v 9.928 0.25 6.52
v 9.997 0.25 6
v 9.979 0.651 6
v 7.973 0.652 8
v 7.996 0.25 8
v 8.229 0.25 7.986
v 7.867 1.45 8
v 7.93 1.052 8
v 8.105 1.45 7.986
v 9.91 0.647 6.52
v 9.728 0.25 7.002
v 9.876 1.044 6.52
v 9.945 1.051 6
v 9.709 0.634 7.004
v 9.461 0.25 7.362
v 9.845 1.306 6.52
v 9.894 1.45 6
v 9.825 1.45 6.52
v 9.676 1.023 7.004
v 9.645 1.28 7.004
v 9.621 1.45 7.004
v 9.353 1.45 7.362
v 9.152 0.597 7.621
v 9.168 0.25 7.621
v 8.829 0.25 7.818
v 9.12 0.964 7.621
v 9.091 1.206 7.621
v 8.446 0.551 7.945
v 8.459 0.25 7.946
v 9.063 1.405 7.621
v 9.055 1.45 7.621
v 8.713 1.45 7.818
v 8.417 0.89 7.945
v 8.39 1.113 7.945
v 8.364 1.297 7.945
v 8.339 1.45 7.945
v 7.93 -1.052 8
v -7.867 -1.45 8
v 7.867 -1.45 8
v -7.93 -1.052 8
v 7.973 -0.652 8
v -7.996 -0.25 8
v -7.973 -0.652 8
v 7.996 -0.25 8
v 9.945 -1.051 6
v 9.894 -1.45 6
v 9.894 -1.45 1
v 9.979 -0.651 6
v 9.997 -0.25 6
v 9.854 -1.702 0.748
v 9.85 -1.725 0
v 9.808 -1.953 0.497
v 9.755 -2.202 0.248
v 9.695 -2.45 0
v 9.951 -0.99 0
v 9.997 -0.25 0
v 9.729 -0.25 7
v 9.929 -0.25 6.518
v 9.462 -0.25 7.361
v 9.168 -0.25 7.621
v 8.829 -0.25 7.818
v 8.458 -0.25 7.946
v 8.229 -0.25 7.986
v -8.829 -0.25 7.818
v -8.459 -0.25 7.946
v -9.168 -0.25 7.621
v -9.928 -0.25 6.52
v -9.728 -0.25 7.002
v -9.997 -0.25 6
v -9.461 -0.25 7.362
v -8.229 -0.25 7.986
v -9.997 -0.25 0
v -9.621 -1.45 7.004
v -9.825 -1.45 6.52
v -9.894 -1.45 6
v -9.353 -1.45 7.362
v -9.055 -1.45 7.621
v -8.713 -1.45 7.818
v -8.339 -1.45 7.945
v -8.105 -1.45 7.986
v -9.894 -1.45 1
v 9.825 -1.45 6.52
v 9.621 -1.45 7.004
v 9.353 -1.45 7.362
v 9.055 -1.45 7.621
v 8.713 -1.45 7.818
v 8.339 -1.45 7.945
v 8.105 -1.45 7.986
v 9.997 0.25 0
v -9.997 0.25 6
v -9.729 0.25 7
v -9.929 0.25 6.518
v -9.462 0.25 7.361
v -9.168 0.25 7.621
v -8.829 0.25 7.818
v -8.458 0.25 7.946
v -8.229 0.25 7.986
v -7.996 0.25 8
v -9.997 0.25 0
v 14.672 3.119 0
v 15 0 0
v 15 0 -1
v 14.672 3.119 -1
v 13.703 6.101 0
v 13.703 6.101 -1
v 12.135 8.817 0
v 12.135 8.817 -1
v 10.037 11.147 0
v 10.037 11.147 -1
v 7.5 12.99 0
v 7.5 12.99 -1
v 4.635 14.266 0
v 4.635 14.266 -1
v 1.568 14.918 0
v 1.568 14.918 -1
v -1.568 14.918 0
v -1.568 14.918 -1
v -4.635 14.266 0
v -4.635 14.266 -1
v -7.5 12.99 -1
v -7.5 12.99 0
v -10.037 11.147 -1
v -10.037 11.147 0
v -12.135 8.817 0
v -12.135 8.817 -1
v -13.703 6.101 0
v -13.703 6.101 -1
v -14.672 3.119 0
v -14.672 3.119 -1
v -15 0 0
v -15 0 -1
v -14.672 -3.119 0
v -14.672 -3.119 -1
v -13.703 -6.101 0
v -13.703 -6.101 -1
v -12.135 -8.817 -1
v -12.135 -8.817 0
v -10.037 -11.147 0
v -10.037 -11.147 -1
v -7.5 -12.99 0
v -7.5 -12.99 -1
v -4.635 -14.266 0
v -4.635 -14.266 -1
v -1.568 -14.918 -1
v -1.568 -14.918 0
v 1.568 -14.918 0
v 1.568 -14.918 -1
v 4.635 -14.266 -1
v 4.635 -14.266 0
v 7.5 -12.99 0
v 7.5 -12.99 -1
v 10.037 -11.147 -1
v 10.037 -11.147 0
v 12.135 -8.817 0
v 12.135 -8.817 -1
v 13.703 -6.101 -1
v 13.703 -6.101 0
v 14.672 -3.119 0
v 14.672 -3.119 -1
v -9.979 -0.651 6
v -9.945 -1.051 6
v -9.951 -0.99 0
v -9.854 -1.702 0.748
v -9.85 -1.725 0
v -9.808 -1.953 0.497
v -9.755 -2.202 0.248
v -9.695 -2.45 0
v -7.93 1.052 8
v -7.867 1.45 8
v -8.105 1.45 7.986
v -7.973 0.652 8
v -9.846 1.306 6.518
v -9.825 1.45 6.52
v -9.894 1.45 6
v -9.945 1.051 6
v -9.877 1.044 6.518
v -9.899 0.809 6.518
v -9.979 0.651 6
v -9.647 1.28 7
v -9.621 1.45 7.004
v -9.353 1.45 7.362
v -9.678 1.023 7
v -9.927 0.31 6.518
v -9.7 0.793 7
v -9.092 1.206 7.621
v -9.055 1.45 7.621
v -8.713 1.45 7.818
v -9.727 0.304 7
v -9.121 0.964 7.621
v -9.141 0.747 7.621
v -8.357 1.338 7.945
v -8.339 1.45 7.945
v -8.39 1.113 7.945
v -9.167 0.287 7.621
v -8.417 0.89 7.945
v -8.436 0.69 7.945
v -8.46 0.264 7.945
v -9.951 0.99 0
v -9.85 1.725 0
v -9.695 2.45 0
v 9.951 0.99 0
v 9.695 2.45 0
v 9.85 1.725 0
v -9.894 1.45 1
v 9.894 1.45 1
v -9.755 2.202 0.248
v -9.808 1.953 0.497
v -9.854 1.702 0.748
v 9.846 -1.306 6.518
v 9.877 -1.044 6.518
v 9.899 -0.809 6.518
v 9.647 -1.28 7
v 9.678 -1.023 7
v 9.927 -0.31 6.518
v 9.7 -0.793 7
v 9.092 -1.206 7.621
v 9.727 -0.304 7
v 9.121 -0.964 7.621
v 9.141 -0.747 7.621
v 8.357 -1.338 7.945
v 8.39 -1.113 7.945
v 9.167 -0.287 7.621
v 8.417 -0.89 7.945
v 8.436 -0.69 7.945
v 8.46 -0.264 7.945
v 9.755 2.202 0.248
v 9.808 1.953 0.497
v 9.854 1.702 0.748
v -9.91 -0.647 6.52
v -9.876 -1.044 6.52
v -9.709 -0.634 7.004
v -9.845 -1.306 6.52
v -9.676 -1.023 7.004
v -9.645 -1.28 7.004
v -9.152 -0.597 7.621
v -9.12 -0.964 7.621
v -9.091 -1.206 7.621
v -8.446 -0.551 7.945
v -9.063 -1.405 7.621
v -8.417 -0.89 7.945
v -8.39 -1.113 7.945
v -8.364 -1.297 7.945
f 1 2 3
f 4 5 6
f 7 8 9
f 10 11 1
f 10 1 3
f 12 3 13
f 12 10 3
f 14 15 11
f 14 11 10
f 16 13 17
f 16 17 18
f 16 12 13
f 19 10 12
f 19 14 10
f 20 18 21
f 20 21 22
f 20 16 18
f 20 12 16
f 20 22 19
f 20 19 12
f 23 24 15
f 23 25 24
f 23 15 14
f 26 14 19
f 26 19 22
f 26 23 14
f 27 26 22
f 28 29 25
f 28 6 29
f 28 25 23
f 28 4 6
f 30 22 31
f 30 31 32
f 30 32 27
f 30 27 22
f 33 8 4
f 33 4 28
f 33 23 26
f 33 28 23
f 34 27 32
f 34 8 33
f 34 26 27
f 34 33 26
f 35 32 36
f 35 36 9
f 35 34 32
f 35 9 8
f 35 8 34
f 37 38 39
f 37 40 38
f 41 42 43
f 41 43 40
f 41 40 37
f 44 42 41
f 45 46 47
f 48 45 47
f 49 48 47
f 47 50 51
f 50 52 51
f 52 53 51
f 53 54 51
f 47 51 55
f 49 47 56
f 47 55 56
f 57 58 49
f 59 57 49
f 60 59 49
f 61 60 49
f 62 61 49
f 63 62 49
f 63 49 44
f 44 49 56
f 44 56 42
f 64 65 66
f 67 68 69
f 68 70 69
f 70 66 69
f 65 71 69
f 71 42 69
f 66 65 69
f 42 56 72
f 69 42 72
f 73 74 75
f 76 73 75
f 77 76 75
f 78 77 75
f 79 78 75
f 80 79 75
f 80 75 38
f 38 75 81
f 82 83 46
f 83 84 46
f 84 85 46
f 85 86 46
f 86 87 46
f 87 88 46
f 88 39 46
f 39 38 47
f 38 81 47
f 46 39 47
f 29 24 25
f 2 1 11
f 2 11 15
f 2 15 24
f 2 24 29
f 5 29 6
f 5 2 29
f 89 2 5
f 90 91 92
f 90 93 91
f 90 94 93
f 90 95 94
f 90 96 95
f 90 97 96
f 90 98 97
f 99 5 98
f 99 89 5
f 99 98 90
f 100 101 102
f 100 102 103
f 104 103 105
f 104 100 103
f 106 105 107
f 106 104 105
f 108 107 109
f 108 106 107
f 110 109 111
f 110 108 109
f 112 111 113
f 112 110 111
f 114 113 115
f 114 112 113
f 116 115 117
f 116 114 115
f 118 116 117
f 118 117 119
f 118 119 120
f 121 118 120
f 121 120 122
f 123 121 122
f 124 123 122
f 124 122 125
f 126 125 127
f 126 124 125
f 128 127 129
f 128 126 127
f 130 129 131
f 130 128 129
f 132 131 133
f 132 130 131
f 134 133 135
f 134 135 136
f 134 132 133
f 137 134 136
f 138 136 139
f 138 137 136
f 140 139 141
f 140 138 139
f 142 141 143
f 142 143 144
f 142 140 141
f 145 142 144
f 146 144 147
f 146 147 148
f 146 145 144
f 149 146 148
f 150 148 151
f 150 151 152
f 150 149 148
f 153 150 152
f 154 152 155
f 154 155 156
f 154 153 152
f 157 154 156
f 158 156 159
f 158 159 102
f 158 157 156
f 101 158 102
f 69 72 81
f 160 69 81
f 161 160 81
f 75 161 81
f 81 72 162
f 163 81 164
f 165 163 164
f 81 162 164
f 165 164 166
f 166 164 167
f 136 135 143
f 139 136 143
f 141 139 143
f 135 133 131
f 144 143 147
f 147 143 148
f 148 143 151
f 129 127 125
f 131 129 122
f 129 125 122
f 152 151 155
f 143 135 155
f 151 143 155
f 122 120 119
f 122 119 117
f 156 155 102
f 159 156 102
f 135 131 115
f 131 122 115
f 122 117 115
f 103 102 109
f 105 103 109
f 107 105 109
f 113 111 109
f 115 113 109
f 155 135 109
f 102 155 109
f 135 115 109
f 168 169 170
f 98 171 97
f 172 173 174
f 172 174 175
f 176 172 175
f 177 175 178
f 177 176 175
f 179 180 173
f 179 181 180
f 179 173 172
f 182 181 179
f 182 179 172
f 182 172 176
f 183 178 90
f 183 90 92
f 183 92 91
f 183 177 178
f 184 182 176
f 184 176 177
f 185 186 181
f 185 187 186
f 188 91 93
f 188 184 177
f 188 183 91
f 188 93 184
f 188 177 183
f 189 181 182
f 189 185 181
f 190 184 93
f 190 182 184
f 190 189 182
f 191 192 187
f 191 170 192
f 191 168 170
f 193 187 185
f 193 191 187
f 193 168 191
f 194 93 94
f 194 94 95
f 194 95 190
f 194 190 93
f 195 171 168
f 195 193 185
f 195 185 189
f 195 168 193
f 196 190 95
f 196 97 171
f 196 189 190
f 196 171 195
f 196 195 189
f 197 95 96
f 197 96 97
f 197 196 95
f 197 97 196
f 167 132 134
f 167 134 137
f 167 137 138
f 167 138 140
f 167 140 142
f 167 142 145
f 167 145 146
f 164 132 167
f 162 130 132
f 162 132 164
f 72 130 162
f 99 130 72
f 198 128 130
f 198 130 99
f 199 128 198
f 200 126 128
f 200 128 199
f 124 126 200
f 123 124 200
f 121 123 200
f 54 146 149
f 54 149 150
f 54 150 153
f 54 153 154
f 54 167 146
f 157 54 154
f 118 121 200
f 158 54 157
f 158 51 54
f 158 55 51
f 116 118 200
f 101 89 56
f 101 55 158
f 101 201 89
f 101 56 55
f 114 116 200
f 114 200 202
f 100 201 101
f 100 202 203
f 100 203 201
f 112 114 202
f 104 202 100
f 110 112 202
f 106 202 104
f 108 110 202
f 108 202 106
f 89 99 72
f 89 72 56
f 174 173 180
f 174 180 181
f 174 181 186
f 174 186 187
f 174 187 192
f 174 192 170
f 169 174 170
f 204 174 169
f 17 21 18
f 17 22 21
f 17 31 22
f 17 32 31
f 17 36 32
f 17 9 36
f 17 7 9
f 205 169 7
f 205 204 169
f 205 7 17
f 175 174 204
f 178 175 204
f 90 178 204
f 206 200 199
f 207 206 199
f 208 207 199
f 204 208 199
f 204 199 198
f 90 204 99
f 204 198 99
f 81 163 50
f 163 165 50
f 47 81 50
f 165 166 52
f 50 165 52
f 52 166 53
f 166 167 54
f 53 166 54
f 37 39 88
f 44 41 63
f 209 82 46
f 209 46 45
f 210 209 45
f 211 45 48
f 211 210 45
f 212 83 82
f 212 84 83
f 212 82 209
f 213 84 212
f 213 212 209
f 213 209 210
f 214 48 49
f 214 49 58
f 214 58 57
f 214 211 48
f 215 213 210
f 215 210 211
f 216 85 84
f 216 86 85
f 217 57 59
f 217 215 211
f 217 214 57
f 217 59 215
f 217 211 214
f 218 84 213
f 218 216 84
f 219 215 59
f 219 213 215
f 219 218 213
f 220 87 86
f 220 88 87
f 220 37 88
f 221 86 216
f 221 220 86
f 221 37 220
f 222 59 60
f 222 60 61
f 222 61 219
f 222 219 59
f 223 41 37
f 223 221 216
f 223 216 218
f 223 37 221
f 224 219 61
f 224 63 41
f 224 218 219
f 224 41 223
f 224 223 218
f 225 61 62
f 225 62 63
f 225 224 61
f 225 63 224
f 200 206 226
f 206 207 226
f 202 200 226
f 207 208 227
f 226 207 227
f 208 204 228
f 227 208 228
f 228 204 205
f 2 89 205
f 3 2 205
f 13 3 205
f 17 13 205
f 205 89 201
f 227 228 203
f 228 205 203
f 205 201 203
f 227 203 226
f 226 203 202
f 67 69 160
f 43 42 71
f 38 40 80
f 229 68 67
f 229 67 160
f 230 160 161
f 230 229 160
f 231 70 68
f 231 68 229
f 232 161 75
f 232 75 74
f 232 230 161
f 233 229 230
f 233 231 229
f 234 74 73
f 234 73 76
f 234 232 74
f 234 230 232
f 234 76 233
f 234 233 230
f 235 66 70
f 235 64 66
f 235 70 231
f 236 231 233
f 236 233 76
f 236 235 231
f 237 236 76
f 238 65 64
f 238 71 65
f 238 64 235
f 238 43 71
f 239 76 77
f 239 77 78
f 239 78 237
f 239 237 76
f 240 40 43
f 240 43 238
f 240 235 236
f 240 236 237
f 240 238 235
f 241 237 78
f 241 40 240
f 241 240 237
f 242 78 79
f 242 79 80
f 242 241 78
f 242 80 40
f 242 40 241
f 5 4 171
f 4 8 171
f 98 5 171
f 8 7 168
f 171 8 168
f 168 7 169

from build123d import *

# Parameters (mm, degrees)
SKETCH_R     = 15
PAD_DEPTH    = 1
PAD001_DEPTH = 8
FILLET_R     = 2
CHAMFER_SIZE = 1


with BuildPart() as part:
    # Sketch → Pad (new body)
    with BuildSketch(Plane.XY):
        Circle(SKETCH_R)
    extrude(amount=-PAD_DEPTH)

    # Sketch001 → Pad001 (join)
    with BuildSketch(Plane.XY):
        with BuildLine():
            Line((-9.894317, 1.45), (9.894317, 1.45))
            ThreePointArc((9.996875, 0.25), (9.963678, 0.851545), (9.894317, 1.45))
            Line((9.996875, 0.25), (-9.996875, 0.25))
            ThreePointArc((-9.894317, 1.45), (-9.963678, 0.851545), (-9.996875, 0.25))
        make_face()
        with BuildLine():
            Line((-9.894317, -1.45), (9.894317, -1.45))
            ThreePointArc((9.894317, -1.45), (9.963678, -0.851545), (9.996875, -0.25))
            Line((9.996875, -0.25), (-9.996875, -0.25))
            ThreePointArc((-9.996875, -0.25), (-9.963678, -0.851545), (-9.894317, -1.45))
        make_face()
    extrude(amount=PAD001_DEPTH)

    # Fillet
    fillet_edges = [part.edges().sort_by_distance(p)[0] for p in [
        (9.963678, -0.851545, 8),
        (-9.963678, -0.851545, 8),
        (-9.963678, 0.851545, 8),
        (9.963678, 0.851545, 8),
    ]]
    fillet(fillet_edges, radius=FILLET_R)

    # Chamfer
    chamfer_edges = [part.edges().sort_by_distance(p)[0] for p in [
        (0, 1.45, 0),
        (0, -1.45, 0),
    ]]
    chamfer(chamfer_edges, length=CHAMFER_SIZE)


solid = part.part
